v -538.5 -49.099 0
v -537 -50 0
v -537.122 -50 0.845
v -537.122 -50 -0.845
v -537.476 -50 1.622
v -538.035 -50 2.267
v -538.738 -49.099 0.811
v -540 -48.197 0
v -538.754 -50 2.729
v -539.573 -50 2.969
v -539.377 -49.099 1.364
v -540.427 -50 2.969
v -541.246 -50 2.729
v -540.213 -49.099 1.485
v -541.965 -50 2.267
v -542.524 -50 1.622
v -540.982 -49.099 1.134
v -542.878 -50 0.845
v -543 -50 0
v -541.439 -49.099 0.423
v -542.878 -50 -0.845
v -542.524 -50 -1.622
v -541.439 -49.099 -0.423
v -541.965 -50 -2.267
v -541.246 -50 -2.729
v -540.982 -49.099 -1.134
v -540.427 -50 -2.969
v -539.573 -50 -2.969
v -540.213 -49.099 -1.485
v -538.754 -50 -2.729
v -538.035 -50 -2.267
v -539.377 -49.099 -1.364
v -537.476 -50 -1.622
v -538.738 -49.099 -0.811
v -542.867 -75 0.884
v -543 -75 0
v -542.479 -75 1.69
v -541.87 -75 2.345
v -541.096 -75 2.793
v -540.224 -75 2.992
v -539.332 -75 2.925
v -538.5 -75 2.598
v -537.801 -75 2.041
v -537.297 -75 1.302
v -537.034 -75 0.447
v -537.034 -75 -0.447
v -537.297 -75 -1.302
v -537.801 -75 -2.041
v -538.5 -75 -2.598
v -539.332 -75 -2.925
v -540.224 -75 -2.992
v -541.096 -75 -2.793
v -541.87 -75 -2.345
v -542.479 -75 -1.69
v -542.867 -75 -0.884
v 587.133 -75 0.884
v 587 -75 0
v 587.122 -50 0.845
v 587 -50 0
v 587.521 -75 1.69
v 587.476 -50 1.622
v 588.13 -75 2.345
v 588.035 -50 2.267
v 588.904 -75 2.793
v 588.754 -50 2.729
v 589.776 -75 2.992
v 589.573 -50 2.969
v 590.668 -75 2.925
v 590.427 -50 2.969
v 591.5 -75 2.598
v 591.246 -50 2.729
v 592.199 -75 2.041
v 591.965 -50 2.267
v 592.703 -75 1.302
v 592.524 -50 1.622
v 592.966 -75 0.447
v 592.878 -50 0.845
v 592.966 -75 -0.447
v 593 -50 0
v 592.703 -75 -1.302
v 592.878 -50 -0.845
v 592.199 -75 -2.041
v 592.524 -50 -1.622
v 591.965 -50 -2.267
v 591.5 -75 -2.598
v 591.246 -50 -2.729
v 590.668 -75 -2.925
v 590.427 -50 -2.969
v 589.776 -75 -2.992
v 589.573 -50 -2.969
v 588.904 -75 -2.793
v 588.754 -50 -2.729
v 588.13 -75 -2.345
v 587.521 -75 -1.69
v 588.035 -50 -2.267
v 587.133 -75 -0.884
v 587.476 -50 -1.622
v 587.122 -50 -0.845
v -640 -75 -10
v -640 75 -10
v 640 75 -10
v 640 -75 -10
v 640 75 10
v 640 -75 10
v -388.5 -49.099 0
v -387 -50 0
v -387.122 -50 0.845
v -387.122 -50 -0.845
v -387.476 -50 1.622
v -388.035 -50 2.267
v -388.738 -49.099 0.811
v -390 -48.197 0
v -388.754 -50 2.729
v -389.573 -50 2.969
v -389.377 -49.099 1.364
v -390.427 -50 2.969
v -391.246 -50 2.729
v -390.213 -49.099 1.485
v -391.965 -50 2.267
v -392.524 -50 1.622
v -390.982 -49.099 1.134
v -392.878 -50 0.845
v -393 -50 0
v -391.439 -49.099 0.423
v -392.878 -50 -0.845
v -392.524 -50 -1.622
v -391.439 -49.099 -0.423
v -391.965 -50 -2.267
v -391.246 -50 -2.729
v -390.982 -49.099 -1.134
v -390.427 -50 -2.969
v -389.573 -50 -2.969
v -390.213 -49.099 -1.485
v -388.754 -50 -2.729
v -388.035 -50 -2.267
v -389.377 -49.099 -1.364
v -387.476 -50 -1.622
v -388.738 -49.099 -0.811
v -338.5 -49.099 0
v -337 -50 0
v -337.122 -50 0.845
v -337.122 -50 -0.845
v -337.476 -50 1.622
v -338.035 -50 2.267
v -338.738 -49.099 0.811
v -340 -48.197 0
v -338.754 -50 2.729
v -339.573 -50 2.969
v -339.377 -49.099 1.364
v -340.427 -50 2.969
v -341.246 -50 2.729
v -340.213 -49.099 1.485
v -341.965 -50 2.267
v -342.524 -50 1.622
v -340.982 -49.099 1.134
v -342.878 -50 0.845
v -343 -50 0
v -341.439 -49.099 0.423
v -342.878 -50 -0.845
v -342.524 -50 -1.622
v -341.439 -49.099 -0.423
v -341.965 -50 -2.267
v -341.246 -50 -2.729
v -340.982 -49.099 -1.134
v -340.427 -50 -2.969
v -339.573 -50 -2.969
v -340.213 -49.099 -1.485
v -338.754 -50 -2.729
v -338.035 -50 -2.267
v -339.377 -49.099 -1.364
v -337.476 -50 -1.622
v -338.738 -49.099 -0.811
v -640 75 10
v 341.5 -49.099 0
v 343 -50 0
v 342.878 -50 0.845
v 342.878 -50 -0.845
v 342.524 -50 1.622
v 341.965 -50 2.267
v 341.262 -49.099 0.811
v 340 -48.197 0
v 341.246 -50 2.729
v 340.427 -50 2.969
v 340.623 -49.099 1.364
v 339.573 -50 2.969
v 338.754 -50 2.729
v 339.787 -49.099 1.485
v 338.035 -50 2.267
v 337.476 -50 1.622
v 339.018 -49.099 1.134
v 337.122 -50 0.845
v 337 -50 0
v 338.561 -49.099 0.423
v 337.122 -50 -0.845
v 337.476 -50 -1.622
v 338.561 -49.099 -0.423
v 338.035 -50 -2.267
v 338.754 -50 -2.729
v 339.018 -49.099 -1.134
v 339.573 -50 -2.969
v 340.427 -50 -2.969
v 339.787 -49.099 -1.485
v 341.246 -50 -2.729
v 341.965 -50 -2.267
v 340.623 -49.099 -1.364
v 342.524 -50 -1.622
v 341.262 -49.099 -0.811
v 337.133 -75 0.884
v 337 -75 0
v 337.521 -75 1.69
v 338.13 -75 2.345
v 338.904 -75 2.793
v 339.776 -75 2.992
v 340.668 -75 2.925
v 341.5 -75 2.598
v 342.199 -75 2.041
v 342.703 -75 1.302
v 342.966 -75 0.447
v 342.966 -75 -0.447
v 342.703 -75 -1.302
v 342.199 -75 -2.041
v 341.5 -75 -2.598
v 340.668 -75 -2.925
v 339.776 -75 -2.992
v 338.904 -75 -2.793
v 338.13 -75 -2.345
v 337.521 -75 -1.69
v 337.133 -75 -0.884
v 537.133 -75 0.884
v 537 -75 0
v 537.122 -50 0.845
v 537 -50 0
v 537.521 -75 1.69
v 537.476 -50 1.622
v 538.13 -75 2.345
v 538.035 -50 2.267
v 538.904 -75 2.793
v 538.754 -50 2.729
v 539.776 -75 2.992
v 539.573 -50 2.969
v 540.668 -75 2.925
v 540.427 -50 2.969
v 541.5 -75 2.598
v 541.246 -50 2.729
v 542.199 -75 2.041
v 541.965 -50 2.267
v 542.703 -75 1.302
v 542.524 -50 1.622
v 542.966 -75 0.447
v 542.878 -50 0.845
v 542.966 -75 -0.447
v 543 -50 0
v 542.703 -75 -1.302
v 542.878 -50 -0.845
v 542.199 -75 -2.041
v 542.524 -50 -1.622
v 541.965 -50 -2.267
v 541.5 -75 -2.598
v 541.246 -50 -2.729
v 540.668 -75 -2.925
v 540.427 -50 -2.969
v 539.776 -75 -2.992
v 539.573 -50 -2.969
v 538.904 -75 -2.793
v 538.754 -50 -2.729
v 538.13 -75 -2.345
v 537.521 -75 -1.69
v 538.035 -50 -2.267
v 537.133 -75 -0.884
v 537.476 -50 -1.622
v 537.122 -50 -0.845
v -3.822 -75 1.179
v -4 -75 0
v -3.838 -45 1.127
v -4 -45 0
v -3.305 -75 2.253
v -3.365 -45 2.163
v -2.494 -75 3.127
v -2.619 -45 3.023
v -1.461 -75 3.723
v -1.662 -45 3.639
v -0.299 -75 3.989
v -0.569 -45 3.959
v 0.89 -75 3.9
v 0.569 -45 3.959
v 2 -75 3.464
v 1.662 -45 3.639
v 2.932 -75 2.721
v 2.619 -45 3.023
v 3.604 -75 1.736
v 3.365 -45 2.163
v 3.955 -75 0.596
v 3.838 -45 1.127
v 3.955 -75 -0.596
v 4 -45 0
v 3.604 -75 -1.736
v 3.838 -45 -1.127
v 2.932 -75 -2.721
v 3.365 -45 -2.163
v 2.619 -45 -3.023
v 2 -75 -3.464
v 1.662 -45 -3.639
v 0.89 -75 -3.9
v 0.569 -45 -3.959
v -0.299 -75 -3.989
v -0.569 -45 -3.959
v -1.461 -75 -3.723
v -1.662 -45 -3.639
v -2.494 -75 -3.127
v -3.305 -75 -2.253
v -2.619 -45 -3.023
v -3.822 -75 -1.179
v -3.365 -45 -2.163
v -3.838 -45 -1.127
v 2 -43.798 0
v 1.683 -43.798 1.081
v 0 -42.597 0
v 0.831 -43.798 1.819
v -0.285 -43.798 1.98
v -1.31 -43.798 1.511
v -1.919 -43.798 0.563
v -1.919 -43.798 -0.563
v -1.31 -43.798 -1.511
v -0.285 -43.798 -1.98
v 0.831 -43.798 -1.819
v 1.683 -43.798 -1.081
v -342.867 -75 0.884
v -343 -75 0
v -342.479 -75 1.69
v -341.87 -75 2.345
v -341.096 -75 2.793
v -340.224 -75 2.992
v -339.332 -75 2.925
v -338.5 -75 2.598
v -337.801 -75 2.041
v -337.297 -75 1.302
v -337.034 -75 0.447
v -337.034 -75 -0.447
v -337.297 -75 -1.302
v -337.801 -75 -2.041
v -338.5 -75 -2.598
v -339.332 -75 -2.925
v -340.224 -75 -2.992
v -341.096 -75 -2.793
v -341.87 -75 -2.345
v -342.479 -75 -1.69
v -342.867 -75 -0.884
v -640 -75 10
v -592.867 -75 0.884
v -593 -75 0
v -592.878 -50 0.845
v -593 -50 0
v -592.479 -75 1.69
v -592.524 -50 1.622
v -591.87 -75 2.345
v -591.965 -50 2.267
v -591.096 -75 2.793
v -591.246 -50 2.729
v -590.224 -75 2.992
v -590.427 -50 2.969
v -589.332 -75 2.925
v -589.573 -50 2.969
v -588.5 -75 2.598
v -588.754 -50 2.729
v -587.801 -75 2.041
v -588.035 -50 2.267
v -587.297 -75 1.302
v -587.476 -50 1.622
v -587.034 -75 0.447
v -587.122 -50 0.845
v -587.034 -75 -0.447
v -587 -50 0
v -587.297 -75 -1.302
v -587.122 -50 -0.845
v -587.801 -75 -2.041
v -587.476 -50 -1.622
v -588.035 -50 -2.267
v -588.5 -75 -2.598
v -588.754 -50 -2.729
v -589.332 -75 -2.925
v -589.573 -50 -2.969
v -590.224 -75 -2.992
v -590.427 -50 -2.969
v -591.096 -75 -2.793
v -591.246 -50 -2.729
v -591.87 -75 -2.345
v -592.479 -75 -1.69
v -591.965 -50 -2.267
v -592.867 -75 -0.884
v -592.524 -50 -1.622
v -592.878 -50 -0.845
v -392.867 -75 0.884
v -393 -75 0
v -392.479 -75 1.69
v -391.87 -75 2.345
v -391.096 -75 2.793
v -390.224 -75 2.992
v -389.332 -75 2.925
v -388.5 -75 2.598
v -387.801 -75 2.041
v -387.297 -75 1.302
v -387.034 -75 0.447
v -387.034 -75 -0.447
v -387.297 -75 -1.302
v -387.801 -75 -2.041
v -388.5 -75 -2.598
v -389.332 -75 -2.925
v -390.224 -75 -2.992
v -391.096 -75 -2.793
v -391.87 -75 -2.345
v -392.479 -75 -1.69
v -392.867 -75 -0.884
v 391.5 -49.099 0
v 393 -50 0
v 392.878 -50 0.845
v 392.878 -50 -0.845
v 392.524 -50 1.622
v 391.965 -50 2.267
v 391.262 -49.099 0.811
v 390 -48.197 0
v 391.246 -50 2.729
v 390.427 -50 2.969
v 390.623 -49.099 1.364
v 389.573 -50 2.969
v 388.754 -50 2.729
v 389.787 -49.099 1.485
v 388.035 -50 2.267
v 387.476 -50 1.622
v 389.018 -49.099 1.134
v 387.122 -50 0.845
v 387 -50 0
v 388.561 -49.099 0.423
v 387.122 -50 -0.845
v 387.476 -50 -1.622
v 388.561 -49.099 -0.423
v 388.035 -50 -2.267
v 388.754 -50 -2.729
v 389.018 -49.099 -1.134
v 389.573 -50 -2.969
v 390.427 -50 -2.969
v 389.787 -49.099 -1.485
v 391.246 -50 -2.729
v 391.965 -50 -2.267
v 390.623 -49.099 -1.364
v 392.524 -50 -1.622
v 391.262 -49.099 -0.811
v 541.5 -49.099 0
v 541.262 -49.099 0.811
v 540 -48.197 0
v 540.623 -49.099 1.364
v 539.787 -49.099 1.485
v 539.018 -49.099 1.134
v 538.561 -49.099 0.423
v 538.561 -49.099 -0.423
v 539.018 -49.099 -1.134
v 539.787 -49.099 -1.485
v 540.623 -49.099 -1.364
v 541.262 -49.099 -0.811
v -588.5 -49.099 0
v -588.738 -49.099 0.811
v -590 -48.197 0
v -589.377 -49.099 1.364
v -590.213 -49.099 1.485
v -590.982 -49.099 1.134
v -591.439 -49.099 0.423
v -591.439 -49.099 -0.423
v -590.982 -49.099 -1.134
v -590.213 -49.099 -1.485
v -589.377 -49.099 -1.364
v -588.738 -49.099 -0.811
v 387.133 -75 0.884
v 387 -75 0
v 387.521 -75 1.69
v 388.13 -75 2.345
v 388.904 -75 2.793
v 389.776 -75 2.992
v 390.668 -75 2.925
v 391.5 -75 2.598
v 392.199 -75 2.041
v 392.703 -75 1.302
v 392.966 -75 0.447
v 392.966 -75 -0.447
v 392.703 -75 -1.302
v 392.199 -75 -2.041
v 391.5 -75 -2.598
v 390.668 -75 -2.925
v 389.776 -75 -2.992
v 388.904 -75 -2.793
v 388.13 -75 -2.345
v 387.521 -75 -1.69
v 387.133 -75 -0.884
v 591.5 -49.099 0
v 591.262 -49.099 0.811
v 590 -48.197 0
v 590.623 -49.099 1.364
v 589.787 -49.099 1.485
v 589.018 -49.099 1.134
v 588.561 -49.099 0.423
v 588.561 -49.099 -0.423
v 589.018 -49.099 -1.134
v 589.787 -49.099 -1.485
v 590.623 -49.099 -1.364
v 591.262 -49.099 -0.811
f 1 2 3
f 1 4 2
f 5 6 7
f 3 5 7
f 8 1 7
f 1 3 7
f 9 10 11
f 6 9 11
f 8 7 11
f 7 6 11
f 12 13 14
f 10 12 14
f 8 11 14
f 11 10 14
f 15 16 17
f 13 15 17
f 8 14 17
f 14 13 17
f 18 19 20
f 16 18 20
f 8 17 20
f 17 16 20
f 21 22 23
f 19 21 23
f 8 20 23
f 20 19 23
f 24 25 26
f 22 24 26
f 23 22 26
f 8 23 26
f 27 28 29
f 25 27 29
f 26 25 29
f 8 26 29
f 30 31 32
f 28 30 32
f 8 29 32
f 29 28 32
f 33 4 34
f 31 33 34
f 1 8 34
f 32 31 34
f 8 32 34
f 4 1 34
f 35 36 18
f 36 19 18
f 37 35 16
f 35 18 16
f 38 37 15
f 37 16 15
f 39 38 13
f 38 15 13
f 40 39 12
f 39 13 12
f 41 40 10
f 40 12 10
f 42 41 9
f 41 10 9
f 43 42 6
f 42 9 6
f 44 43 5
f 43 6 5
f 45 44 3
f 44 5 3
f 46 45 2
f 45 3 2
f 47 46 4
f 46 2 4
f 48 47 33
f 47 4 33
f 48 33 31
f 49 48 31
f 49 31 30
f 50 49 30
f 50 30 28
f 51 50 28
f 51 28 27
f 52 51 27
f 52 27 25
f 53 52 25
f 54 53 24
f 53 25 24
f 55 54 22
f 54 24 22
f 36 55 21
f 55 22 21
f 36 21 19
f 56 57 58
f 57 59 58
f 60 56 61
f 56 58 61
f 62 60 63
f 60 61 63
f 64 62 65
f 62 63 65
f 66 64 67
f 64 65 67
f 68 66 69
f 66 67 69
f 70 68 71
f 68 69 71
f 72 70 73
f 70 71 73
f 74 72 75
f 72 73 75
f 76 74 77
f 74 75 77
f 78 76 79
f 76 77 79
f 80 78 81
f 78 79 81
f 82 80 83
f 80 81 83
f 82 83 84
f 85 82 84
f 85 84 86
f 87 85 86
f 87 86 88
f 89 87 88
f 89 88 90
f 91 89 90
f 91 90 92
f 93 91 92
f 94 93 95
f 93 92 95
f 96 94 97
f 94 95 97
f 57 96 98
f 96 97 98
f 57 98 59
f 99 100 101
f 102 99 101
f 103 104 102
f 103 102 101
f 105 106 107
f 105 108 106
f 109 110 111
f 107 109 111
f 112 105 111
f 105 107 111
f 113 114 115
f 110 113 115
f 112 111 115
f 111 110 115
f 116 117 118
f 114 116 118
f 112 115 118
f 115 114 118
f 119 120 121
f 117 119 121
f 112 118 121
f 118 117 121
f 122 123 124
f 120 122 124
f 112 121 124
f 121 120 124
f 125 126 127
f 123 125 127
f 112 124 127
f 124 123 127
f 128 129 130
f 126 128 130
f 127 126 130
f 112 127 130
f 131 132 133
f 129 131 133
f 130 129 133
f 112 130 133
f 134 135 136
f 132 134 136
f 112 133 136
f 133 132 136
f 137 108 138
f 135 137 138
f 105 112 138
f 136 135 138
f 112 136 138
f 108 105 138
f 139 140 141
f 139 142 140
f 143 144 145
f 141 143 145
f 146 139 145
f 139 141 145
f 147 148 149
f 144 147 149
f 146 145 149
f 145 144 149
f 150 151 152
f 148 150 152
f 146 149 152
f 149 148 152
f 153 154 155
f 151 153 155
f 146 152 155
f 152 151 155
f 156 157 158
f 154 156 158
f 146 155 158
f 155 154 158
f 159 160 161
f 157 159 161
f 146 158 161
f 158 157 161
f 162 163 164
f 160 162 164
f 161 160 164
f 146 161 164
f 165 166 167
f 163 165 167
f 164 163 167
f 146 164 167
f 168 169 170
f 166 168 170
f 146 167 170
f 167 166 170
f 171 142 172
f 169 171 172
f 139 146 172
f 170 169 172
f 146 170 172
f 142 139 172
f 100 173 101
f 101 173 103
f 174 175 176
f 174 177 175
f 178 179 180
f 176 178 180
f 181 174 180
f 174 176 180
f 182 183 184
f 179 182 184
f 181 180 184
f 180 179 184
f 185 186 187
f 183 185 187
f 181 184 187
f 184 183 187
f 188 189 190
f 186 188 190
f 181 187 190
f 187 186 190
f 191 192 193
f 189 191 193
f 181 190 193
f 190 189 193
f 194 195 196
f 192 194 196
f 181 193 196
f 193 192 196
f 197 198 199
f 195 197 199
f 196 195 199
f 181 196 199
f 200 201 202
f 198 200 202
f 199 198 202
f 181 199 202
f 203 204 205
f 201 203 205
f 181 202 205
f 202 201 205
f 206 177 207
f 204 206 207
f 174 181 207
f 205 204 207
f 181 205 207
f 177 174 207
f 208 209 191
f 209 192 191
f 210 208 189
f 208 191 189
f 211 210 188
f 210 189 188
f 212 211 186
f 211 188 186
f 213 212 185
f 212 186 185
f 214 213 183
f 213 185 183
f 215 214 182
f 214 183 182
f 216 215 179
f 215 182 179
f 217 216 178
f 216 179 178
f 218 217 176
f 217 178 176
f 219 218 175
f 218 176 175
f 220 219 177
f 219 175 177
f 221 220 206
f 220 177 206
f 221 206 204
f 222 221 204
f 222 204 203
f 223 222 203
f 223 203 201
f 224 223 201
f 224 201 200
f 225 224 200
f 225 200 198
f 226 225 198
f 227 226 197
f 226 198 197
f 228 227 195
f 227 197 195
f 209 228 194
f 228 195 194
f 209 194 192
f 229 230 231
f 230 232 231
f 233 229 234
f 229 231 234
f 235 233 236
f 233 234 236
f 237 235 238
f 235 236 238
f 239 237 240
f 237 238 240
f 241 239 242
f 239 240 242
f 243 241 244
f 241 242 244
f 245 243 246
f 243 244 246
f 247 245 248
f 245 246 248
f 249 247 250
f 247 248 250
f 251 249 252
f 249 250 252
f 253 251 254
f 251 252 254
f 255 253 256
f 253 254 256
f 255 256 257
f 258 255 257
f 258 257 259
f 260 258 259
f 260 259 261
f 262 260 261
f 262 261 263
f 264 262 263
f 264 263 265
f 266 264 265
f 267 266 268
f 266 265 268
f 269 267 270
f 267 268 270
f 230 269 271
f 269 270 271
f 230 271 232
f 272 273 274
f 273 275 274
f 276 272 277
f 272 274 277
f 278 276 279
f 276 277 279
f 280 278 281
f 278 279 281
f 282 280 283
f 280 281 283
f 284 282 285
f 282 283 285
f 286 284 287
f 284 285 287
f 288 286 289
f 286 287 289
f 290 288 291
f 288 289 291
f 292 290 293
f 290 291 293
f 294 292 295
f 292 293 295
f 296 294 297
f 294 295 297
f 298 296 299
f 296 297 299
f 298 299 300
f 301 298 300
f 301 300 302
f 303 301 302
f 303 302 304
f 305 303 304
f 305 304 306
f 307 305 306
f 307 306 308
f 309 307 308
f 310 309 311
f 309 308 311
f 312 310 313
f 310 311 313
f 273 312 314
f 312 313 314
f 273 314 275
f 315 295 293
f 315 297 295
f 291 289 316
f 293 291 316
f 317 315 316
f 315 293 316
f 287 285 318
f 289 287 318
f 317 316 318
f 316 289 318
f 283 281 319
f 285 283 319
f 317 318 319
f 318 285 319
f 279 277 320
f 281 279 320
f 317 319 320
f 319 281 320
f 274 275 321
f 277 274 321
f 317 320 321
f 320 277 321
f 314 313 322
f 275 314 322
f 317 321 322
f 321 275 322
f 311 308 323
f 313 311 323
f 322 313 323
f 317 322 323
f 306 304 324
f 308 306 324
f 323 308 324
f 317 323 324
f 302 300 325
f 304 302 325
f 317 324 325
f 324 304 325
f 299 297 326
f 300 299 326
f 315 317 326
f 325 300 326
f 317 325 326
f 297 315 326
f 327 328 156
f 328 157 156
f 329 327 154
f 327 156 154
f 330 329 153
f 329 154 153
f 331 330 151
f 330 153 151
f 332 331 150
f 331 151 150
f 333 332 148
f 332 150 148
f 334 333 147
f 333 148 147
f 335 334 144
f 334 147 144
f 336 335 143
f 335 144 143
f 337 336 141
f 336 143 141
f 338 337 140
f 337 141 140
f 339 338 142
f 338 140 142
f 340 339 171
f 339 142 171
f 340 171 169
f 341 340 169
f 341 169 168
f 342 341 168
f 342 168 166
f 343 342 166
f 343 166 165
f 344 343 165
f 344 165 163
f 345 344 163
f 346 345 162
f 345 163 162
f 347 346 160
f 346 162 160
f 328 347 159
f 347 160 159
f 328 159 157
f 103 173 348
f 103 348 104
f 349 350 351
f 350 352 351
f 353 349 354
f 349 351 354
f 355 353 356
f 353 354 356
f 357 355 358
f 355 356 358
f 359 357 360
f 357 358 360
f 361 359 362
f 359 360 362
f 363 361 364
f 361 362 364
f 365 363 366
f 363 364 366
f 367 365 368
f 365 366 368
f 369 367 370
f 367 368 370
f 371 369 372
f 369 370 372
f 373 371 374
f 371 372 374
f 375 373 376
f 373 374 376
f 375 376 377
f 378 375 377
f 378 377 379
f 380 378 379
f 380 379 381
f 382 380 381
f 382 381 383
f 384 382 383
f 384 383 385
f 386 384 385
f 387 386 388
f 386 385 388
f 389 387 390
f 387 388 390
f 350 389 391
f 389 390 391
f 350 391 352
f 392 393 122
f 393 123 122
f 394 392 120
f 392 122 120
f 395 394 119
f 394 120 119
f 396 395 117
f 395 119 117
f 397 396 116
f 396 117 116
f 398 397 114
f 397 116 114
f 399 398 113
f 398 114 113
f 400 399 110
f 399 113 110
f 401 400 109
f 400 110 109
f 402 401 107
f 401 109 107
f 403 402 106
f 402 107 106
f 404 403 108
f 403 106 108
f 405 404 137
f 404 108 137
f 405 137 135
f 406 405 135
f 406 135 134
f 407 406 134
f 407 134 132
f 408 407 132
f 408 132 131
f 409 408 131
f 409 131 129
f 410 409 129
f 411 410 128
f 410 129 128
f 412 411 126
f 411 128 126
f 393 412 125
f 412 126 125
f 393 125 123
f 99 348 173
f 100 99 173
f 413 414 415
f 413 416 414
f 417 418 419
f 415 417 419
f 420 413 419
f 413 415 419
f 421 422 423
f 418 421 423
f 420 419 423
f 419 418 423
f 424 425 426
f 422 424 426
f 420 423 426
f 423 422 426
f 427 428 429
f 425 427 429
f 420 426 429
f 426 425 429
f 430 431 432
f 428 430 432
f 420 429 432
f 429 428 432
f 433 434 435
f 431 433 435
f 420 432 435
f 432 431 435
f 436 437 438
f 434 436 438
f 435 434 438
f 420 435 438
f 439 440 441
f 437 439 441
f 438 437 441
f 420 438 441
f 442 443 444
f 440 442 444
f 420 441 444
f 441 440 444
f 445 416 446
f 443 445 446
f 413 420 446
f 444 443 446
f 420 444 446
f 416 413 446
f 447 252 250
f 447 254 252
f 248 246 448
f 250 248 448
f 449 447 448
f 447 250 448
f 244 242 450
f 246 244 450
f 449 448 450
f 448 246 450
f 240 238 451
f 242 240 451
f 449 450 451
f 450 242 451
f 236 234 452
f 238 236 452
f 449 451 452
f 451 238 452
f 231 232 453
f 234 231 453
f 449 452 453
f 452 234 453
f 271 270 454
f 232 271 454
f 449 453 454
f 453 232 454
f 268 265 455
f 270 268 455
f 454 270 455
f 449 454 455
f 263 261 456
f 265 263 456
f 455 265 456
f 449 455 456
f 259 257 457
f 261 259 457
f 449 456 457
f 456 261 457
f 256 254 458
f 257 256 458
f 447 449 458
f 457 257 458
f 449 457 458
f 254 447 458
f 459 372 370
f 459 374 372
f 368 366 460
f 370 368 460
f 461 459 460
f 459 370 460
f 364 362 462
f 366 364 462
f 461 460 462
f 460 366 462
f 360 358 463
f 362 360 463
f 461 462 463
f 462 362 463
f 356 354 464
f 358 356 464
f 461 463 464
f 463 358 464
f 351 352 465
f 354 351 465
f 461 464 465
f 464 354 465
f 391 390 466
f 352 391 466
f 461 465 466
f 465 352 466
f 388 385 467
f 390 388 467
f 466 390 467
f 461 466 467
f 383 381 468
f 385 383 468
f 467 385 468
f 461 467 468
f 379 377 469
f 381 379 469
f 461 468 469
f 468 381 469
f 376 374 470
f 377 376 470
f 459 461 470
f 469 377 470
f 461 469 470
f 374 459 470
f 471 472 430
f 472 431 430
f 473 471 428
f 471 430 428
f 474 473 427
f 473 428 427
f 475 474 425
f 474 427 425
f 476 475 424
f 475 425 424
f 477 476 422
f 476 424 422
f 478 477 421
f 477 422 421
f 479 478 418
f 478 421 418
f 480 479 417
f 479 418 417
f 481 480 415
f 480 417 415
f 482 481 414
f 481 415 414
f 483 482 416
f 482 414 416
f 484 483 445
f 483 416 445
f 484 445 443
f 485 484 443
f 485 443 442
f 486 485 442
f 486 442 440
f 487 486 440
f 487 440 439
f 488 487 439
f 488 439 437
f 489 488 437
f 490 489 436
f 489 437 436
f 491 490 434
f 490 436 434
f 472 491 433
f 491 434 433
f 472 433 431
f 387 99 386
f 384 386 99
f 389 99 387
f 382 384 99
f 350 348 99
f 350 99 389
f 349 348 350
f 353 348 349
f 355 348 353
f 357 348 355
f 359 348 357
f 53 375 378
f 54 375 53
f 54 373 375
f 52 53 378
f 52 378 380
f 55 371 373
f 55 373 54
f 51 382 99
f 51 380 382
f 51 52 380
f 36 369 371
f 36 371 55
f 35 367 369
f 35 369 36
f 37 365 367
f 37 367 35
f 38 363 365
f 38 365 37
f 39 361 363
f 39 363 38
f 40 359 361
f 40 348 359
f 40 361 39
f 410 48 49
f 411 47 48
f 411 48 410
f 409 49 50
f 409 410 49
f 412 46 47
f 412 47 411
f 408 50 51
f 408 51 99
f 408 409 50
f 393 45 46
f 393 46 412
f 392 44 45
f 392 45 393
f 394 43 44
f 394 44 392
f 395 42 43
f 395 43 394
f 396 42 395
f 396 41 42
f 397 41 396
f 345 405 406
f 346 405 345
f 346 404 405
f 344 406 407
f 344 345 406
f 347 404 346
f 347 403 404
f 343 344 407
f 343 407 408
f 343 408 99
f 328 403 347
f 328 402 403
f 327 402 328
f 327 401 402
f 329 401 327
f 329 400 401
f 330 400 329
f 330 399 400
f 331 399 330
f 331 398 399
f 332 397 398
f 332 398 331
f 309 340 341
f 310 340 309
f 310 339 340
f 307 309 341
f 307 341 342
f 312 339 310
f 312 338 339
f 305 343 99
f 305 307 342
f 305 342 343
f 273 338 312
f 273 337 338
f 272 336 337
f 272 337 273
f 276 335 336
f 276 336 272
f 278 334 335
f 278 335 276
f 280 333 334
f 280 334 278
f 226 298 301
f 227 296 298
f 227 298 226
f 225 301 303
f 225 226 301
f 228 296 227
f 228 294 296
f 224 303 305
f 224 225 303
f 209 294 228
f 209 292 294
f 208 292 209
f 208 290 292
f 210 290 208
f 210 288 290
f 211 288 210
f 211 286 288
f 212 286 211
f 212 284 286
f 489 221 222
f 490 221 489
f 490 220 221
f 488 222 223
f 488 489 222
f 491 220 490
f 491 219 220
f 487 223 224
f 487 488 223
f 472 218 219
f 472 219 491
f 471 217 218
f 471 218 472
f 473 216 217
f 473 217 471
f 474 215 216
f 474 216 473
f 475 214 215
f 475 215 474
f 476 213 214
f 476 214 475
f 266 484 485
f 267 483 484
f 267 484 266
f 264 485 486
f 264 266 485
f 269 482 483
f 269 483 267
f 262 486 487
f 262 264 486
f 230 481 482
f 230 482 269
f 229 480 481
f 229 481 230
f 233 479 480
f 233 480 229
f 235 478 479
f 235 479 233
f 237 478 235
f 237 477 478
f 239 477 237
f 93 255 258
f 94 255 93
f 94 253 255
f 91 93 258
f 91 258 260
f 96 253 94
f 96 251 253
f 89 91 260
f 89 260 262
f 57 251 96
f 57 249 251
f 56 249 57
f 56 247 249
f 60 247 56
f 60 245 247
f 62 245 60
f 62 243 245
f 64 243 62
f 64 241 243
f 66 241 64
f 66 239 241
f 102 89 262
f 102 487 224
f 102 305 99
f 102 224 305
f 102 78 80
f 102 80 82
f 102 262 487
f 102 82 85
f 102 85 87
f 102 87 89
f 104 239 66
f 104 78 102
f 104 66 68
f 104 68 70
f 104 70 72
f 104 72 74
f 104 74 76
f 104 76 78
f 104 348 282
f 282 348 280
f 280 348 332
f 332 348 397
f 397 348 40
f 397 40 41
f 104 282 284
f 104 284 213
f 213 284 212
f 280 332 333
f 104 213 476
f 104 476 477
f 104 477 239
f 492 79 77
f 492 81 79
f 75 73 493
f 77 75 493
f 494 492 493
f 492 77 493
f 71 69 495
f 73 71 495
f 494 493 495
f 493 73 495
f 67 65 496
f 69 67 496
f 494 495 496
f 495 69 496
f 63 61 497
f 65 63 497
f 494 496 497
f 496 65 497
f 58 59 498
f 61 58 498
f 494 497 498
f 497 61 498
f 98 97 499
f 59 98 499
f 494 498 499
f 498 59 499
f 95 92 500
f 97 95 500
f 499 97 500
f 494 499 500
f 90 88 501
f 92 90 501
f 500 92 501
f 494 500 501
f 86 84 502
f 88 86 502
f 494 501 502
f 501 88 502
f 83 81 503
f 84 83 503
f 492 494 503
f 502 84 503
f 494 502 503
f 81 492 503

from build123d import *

# Parameters (mm, degrees)
F0_W     = 1280
F0_H     = 150
F1_DEPTH = 10
F3_D     = 6
F3_DEPTH = 25
F3_TIP   = 1.8025818571
F4_D     = 8
F4_DEPTH = 30
F4_TIP   = 2.4034424761


with BuildPart() as f1:
    # F0 (on Top) → F1 (new body, symmetric)
    with BuildSketch(Plane.XY):
        Rectangle(F0_W, F0_H)
    extrude(amount=F1_DEPTH, both=True)

    # F3
    with Locations(Plane.XZ.offset(75)):
        with Locations((-590, 0), (-540, 0), (-390, 0), (-340, 0), (340, 0), (390, 0), (540, 0), (590, 0)):
            Hole(F3_D / 2, depth=F3_DEPTH)
            with Locations((0, 0, -(F3_DEPTH + F3_TIP / 2))):  # 118° drill point
                Cone(0, F3_D / 2, F3_TIP, mode=Mode.SUBTRACT)

    # F4
    with Locations(Plane.XZ.offset(75)):
        with Locations((0, 0)):
            Hole(F4_D / 2, depth=F4_DEPTH)
            with Locations((0, 0, -(F4_DEPTH + F4_TIP / 2))):  # 118° drill point
                Cone(0, F4_D / 2, F4_TIP, mode=Mode.SUBTRACT)


solid = f1.part
